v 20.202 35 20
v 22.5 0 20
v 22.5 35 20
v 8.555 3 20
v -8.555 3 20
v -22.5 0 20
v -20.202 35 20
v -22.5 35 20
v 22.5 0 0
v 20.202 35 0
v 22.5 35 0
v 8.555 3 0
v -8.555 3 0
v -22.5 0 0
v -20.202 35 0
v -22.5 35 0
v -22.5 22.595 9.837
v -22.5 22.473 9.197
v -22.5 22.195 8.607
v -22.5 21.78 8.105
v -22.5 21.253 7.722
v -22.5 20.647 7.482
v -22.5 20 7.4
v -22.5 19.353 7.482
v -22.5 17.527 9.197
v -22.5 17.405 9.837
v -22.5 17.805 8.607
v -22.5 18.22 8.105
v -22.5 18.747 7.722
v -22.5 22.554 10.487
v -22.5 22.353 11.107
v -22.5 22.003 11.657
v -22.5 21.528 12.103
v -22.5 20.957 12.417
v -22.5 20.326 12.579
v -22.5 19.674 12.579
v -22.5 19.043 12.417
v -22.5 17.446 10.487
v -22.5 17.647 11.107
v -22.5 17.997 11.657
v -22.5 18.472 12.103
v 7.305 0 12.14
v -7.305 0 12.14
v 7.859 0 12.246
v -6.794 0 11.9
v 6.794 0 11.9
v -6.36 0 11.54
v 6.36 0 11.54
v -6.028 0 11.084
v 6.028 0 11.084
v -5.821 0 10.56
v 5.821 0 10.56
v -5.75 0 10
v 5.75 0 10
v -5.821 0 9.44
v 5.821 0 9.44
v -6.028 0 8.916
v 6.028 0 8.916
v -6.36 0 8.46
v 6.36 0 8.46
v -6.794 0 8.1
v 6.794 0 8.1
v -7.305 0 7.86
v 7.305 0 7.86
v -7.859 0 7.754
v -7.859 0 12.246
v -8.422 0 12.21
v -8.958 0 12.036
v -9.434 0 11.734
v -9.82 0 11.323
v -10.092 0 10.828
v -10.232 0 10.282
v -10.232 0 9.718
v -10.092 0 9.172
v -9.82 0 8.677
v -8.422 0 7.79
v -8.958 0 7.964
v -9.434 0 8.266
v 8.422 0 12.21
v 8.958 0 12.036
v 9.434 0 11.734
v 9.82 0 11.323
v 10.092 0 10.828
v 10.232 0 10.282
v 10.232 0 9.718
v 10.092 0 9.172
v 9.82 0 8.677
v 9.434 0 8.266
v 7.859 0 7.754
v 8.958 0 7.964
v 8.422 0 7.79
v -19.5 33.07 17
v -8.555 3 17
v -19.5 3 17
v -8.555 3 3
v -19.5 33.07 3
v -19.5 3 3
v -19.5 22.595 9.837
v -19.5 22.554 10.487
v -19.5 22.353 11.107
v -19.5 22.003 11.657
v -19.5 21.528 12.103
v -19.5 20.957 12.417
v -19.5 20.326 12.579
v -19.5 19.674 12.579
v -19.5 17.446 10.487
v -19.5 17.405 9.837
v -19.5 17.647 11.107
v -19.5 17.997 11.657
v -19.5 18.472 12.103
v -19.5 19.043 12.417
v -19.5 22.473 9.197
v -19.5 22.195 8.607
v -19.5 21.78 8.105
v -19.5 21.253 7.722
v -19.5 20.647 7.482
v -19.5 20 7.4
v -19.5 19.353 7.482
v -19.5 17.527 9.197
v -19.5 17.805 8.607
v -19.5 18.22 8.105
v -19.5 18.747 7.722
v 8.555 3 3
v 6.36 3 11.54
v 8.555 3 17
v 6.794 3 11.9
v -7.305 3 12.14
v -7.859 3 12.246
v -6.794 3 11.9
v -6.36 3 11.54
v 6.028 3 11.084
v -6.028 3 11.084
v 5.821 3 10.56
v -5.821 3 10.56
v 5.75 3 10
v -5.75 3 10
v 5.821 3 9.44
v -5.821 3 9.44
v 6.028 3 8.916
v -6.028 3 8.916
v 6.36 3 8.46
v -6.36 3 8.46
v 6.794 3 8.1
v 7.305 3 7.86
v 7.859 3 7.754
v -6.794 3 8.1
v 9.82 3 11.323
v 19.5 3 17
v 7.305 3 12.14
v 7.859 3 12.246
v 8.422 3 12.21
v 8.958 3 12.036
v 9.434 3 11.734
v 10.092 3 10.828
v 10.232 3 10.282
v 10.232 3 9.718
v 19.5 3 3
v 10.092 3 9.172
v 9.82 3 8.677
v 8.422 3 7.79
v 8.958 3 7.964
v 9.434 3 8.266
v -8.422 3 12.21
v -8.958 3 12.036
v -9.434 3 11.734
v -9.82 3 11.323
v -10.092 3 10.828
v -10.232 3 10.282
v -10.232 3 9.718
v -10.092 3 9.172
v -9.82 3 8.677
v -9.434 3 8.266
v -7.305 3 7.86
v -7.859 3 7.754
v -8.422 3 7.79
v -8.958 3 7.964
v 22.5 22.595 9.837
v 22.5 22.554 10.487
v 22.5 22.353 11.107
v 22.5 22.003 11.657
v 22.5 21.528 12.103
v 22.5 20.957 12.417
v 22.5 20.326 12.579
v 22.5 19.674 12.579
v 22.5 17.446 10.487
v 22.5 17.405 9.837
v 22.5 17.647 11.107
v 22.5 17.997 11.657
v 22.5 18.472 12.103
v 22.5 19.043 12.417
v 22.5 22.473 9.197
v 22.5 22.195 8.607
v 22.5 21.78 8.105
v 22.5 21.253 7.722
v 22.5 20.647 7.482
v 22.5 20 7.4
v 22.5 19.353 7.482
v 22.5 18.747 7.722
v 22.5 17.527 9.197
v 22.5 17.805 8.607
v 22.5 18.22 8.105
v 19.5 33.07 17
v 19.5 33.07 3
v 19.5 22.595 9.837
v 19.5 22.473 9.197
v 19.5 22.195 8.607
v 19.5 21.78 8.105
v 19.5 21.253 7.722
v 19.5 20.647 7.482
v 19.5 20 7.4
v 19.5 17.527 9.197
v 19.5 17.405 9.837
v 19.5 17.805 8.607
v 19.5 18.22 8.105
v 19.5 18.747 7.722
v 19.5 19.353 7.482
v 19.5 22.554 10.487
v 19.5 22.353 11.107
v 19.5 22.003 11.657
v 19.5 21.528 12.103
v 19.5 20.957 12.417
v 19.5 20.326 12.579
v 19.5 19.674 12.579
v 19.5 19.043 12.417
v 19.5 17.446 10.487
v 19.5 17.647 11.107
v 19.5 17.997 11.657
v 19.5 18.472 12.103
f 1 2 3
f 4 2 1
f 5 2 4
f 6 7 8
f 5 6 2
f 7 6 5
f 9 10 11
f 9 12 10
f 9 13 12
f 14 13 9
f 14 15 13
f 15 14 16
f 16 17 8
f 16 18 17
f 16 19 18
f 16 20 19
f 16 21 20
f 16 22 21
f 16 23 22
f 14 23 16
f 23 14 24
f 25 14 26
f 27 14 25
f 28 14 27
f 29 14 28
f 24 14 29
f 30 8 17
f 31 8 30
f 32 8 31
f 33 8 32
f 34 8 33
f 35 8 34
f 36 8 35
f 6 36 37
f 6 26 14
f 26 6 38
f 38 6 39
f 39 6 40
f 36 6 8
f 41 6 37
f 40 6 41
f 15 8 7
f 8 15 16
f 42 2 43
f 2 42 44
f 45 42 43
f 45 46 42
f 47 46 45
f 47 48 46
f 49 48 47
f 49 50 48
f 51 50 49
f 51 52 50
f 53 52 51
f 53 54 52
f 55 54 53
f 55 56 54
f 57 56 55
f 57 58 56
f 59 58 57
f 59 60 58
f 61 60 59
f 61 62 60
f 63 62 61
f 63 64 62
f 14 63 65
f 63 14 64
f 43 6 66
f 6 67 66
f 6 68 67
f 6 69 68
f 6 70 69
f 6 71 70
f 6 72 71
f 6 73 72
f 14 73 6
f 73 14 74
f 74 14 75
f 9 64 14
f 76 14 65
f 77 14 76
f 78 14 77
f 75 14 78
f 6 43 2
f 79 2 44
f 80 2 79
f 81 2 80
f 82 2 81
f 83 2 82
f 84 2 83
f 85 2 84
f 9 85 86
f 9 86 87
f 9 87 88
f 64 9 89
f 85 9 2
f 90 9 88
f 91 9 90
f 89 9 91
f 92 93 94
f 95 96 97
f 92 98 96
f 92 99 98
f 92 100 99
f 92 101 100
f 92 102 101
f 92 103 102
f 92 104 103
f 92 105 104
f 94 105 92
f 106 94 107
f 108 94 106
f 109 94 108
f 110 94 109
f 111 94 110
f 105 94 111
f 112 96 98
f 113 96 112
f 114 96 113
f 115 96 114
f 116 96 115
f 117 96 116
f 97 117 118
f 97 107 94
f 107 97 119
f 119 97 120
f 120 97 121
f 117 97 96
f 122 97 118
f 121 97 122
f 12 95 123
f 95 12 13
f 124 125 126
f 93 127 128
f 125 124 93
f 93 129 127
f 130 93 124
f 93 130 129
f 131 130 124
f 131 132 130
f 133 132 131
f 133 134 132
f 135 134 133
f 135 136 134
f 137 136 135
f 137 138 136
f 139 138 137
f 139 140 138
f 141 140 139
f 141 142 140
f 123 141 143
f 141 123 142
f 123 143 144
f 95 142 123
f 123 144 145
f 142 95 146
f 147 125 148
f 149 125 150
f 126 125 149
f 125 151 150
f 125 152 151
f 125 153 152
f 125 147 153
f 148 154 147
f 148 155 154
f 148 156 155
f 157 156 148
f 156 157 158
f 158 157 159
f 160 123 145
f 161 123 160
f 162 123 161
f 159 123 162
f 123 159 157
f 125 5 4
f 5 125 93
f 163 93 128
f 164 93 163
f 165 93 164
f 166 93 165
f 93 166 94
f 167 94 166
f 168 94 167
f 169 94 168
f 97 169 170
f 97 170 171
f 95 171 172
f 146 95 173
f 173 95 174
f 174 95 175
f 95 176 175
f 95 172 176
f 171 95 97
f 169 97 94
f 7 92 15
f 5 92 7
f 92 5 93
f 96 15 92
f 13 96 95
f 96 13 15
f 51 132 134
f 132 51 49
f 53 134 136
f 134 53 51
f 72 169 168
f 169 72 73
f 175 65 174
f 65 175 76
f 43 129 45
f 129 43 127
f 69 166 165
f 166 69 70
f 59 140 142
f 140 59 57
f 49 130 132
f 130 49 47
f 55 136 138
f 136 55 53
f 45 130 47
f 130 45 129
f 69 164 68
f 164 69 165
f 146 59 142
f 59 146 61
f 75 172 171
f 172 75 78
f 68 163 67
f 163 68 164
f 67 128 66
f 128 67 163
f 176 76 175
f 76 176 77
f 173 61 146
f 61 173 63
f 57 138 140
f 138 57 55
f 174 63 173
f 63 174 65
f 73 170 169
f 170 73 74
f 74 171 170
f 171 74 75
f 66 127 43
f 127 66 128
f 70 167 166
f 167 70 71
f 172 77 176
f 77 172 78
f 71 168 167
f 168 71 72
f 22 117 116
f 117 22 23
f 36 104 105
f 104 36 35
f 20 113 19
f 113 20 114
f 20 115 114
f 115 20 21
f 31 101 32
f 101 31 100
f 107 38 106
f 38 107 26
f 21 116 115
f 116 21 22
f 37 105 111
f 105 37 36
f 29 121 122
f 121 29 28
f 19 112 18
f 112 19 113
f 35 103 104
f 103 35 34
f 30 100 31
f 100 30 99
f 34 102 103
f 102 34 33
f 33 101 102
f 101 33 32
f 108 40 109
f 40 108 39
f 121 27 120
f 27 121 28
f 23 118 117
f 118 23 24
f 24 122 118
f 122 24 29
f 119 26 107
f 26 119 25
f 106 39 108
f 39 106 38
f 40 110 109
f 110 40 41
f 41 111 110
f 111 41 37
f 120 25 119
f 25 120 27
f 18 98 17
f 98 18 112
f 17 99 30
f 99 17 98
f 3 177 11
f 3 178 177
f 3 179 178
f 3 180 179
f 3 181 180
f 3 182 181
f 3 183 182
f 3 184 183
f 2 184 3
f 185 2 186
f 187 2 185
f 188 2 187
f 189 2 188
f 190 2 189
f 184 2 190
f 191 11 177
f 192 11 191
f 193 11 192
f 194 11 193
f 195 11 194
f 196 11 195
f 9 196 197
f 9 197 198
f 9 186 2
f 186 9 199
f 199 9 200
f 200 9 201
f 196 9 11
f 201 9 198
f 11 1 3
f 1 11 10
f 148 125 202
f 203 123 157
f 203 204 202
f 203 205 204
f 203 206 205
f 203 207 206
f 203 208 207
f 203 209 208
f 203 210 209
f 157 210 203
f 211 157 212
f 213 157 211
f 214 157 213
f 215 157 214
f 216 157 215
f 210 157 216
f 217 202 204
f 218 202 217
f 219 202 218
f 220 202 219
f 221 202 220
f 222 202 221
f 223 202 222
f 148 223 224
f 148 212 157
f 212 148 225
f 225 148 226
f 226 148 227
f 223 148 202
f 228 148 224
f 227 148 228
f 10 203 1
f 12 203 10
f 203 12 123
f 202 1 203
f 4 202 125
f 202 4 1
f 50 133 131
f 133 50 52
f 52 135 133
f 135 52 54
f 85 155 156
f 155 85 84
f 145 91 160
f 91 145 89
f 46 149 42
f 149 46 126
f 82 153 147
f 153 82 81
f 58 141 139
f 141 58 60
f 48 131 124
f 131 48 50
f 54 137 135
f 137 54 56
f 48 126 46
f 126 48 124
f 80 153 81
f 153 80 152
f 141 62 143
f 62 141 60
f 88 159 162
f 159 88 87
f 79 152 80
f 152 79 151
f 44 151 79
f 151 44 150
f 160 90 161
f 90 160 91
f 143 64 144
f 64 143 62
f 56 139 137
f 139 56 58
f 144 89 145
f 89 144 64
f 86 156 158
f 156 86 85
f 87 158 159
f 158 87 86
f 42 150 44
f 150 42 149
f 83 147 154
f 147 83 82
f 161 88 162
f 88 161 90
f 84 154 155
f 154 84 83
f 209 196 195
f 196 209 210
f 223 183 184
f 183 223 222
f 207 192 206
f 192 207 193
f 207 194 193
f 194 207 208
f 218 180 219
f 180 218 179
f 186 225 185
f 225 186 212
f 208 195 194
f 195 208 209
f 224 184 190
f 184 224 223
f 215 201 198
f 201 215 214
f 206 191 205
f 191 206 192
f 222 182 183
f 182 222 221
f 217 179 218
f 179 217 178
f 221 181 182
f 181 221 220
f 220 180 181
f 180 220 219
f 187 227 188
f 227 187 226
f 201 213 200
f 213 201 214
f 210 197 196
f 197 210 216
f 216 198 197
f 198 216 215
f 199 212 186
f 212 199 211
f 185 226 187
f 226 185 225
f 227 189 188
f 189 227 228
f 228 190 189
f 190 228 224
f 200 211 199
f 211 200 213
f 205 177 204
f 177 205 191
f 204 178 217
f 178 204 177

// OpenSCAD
// 90 degree bracket

$fn    = 25;
length = 45;
height = 35;
width  = 20;
walls  = 3;

angle = 20;

axle_diam   = 5;
axle_gap    = 0.2;
axle_height = 20;

screwhole_diam = 4.5;
axlehole_diam  = axle_diam + axle_gap;

module half() {
translate([-length/2, 0, 0])
difference()  {
    cube([length/2, height, width], center=false);
    
    translate([walls, walls, walls])
      cube([length-2*walls, height, width-(walls * 2)], center=false);
    
    translate([walls+(height-walls)*cos(90-angle), walls, 0])
      rotate([0,0,angle])
        cube([2*height, 2*height, width+2], center=false);

    translate([walls+(height-walls)*cos(90-angle), walls, 0])
      cube([2*height, 2*height, width+2], center=false);

    // bottom screw hole
    translate([length/2 - 8, walls+1, width/2])
    rotate([90, 0, 0])
    #cylinder(d=screwhole_diam, h=walls+2);

    // side hole
    translate([-1, axle_height, width/2])
    rotate([0, 90, 0])
    #cylinder(d=axlehole_diam, h=walls+2);

  }
}


module whole() {
 union() {
   half();
   mirror([1,0,0])
     half();
 }
}

whole();
